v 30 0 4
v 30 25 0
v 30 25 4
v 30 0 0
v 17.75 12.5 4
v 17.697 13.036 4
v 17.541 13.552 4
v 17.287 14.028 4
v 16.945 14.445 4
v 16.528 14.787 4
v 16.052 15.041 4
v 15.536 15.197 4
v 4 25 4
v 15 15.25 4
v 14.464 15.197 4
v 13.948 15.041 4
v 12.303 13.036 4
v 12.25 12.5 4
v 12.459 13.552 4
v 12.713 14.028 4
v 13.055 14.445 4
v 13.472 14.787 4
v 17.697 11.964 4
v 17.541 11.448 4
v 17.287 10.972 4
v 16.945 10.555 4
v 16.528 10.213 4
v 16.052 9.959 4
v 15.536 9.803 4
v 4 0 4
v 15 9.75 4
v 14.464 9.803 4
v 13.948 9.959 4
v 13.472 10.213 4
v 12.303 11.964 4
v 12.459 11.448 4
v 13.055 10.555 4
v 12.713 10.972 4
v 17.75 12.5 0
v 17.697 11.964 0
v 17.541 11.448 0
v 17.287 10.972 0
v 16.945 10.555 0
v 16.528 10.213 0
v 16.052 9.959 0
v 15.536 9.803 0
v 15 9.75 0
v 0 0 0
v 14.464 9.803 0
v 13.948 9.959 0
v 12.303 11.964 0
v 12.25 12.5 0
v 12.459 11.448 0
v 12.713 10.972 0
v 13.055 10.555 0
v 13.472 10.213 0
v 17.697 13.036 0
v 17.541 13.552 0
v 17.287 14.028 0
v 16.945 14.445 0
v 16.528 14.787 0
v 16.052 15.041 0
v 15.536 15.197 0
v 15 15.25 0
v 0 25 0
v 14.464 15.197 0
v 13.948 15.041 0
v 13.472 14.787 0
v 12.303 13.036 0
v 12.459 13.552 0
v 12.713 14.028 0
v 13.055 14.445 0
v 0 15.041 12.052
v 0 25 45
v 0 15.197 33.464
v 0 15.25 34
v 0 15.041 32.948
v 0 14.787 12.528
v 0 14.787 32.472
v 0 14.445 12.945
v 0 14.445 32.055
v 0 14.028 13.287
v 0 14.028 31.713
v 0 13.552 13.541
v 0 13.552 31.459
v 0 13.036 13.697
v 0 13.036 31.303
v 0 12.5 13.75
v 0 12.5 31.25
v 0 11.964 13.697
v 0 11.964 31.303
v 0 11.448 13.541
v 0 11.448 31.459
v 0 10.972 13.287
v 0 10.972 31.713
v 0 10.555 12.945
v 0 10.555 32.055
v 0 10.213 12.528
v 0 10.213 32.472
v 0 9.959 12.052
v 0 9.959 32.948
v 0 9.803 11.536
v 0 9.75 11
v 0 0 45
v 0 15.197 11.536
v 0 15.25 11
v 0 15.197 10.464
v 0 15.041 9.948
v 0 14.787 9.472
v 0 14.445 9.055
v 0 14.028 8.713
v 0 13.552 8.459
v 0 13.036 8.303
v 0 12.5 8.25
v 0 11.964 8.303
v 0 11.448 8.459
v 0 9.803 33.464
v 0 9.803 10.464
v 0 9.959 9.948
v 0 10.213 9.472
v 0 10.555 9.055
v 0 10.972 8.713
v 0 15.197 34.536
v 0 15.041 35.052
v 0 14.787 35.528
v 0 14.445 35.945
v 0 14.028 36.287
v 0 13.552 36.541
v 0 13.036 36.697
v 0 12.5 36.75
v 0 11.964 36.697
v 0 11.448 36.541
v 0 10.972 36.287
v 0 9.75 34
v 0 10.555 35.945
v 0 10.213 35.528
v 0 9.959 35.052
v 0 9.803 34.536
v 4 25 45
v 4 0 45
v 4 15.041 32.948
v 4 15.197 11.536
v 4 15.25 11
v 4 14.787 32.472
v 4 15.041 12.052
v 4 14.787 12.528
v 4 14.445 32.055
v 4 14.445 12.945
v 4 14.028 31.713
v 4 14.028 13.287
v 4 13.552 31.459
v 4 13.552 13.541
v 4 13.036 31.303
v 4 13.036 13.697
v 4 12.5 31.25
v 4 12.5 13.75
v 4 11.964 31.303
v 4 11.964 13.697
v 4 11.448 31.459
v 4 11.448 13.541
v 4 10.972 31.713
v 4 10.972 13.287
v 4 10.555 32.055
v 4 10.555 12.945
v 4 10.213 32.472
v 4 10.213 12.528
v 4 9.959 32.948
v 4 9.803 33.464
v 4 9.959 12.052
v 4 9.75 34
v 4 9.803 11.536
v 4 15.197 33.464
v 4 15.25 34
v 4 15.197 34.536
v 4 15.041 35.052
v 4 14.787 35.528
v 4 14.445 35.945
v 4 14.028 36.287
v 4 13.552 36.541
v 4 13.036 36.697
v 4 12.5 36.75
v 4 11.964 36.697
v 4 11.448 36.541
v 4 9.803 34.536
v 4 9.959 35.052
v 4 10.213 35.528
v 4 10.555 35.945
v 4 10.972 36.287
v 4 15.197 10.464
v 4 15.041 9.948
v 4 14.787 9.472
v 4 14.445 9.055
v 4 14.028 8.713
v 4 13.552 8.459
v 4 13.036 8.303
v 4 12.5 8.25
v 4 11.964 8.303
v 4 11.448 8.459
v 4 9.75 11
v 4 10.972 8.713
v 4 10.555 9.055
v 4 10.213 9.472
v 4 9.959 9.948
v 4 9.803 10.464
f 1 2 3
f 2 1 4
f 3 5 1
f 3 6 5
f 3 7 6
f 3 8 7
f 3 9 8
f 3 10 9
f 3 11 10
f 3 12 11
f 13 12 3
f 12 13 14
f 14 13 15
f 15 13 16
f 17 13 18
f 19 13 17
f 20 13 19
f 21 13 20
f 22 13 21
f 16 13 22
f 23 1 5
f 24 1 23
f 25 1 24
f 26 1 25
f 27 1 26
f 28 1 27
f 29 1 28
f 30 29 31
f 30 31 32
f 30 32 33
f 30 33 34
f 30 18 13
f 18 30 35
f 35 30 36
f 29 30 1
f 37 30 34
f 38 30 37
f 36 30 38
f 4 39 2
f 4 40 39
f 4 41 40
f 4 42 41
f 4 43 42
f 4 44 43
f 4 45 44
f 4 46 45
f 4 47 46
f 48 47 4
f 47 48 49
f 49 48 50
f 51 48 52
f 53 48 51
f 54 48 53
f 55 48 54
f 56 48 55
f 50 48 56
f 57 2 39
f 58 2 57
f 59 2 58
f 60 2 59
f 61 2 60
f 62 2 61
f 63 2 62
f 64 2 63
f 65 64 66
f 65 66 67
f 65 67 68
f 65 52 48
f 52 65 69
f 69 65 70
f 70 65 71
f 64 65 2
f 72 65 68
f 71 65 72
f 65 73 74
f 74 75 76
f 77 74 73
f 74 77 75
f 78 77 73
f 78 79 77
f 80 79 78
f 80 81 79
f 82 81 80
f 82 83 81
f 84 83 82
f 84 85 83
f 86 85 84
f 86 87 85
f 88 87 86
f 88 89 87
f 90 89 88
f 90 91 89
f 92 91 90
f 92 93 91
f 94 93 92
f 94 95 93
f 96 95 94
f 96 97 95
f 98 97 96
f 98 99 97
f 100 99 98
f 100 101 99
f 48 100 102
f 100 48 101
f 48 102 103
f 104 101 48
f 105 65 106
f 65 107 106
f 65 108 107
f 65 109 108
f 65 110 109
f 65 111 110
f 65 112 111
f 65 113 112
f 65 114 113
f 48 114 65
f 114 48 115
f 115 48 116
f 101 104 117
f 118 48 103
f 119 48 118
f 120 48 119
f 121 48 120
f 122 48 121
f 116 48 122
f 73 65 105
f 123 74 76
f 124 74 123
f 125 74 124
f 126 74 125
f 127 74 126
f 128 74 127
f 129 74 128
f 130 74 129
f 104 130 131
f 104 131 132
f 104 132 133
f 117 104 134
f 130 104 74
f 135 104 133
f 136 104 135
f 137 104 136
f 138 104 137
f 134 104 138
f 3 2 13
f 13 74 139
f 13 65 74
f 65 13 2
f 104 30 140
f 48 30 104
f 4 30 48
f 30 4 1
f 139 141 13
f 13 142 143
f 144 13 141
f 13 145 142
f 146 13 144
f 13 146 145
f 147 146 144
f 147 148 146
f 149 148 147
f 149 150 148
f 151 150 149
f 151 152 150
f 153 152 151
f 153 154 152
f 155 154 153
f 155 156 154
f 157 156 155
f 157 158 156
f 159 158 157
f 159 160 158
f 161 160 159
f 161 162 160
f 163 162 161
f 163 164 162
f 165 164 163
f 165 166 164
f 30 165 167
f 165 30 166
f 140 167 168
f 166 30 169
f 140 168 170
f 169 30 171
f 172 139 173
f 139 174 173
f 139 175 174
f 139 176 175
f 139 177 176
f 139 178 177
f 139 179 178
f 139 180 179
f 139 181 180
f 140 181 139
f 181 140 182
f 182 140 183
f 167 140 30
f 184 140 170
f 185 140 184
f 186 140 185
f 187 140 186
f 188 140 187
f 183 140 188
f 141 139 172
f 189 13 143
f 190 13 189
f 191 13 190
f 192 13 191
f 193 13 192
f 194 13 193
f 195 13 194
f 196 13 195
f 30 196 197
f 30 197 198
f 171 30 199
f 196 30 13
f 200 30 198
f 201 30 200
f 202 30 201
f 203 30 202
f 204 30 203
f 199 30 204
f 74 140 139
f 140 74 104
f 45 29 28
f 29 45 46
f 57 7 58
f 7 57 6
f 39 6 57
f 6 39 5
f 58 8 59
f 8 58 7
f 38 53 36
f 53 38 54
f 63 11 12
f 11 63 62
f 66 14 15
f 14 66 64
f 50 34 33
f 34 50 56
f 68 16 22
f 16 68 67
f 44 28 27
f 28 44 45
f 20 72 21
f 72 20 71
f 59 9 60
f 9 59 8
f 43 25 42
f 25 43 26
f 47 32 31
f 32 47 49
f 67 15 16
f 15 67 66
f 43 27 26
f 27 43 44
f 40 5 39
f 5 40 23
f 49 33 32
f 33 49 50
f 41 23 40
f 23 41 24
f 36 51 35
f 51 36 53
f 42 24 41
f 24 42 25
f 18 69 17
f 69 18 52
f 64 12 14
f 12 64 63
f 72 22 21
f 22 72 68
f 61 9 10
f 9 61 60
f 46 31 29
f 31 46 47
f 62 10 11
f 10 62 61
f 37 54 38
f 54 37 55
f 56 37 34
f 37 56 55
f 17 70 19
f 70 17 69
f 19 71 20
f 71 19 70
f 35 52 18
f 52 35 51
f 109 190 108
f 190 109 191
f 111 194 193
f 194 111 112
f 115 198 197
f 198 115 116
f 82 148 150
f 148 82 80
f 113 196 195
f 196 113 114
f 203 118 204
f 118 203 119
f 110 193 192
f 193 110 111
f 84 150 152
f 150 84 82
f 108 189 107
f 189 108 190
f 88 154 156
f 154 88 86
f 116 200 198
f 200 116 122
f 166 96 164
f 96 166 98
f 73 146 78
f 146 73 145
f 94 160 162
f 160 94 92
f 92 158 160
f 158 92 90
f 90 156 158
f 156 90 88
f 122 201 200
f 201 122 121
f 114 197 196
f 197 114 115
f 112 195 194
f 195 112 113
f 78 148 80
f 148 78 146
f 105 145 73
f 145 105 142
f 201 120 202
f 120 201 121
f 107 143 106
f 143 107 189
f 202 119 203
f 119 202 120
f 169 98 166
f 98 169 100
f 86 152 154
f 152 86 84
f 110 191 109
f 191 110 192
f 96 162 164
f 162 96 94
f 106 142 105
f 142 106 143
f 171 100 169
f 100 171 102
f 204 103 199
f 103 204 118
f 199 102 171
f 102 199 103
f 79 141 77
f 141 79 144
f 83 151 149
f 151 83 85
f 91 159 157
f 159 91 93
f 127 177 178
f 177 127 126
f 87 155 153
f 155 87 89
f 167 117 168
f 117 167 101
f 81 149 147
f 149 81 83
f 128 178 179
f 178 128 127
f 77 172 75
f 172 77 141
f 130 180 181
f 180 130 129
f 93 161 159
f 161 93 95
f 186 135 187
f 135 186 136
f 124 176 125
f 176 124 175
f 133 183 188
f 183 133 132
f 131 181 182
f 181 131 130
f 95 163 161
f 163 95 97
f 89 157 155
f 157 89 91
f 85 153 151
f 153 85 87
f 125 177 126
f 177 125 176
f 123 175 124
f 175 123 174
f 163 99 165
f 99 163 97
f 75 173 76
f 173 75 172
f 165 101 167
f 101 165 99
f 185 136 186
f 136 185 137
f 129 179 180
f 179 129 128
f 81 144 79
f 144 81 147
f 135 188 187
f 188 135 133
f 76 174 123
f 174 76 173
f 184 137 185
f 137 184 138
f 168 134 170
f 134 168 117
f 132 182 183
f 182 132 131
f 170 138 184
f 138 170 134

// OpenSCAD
$fn = 32;

// ----------------------------------------------------------------------
// L-bracket: 30 x 25 x 45 mm
// ----------------------------------------------------------------------

// --- parameters (mm) ---
run_out = 30;             // horizontal leg, X
rise = 45;                // vertical leg, Z
bracket_w = 25;           // bracket depth, Y
sheet_t = 4;              // plate thickness
hole_d = 5.5;             // clearance for M5

module hole_z(px, py) {
  translate([px, py, -0.5]) cylinder(h = sheet_t + 1, d = hole_d);
}
module hole_x(pz, py) {
  translate([-0.5, py, pz]) rotate([0, 90, 0]) cylinder(h = sheet_t + 1, d = hole_d);
}

difference() {
  union() {
    /* horizontal leg */
    cube([run_out, bracket_w, sheet_t]);
    /* vertical leg, overlapping the corner block */
    cube([sheet_t, bracket_w, rise]);
  }
  hole_z(15, 12.5);
  hole_x(11, 12.5);
  hole_x(34, 12.5);
}
